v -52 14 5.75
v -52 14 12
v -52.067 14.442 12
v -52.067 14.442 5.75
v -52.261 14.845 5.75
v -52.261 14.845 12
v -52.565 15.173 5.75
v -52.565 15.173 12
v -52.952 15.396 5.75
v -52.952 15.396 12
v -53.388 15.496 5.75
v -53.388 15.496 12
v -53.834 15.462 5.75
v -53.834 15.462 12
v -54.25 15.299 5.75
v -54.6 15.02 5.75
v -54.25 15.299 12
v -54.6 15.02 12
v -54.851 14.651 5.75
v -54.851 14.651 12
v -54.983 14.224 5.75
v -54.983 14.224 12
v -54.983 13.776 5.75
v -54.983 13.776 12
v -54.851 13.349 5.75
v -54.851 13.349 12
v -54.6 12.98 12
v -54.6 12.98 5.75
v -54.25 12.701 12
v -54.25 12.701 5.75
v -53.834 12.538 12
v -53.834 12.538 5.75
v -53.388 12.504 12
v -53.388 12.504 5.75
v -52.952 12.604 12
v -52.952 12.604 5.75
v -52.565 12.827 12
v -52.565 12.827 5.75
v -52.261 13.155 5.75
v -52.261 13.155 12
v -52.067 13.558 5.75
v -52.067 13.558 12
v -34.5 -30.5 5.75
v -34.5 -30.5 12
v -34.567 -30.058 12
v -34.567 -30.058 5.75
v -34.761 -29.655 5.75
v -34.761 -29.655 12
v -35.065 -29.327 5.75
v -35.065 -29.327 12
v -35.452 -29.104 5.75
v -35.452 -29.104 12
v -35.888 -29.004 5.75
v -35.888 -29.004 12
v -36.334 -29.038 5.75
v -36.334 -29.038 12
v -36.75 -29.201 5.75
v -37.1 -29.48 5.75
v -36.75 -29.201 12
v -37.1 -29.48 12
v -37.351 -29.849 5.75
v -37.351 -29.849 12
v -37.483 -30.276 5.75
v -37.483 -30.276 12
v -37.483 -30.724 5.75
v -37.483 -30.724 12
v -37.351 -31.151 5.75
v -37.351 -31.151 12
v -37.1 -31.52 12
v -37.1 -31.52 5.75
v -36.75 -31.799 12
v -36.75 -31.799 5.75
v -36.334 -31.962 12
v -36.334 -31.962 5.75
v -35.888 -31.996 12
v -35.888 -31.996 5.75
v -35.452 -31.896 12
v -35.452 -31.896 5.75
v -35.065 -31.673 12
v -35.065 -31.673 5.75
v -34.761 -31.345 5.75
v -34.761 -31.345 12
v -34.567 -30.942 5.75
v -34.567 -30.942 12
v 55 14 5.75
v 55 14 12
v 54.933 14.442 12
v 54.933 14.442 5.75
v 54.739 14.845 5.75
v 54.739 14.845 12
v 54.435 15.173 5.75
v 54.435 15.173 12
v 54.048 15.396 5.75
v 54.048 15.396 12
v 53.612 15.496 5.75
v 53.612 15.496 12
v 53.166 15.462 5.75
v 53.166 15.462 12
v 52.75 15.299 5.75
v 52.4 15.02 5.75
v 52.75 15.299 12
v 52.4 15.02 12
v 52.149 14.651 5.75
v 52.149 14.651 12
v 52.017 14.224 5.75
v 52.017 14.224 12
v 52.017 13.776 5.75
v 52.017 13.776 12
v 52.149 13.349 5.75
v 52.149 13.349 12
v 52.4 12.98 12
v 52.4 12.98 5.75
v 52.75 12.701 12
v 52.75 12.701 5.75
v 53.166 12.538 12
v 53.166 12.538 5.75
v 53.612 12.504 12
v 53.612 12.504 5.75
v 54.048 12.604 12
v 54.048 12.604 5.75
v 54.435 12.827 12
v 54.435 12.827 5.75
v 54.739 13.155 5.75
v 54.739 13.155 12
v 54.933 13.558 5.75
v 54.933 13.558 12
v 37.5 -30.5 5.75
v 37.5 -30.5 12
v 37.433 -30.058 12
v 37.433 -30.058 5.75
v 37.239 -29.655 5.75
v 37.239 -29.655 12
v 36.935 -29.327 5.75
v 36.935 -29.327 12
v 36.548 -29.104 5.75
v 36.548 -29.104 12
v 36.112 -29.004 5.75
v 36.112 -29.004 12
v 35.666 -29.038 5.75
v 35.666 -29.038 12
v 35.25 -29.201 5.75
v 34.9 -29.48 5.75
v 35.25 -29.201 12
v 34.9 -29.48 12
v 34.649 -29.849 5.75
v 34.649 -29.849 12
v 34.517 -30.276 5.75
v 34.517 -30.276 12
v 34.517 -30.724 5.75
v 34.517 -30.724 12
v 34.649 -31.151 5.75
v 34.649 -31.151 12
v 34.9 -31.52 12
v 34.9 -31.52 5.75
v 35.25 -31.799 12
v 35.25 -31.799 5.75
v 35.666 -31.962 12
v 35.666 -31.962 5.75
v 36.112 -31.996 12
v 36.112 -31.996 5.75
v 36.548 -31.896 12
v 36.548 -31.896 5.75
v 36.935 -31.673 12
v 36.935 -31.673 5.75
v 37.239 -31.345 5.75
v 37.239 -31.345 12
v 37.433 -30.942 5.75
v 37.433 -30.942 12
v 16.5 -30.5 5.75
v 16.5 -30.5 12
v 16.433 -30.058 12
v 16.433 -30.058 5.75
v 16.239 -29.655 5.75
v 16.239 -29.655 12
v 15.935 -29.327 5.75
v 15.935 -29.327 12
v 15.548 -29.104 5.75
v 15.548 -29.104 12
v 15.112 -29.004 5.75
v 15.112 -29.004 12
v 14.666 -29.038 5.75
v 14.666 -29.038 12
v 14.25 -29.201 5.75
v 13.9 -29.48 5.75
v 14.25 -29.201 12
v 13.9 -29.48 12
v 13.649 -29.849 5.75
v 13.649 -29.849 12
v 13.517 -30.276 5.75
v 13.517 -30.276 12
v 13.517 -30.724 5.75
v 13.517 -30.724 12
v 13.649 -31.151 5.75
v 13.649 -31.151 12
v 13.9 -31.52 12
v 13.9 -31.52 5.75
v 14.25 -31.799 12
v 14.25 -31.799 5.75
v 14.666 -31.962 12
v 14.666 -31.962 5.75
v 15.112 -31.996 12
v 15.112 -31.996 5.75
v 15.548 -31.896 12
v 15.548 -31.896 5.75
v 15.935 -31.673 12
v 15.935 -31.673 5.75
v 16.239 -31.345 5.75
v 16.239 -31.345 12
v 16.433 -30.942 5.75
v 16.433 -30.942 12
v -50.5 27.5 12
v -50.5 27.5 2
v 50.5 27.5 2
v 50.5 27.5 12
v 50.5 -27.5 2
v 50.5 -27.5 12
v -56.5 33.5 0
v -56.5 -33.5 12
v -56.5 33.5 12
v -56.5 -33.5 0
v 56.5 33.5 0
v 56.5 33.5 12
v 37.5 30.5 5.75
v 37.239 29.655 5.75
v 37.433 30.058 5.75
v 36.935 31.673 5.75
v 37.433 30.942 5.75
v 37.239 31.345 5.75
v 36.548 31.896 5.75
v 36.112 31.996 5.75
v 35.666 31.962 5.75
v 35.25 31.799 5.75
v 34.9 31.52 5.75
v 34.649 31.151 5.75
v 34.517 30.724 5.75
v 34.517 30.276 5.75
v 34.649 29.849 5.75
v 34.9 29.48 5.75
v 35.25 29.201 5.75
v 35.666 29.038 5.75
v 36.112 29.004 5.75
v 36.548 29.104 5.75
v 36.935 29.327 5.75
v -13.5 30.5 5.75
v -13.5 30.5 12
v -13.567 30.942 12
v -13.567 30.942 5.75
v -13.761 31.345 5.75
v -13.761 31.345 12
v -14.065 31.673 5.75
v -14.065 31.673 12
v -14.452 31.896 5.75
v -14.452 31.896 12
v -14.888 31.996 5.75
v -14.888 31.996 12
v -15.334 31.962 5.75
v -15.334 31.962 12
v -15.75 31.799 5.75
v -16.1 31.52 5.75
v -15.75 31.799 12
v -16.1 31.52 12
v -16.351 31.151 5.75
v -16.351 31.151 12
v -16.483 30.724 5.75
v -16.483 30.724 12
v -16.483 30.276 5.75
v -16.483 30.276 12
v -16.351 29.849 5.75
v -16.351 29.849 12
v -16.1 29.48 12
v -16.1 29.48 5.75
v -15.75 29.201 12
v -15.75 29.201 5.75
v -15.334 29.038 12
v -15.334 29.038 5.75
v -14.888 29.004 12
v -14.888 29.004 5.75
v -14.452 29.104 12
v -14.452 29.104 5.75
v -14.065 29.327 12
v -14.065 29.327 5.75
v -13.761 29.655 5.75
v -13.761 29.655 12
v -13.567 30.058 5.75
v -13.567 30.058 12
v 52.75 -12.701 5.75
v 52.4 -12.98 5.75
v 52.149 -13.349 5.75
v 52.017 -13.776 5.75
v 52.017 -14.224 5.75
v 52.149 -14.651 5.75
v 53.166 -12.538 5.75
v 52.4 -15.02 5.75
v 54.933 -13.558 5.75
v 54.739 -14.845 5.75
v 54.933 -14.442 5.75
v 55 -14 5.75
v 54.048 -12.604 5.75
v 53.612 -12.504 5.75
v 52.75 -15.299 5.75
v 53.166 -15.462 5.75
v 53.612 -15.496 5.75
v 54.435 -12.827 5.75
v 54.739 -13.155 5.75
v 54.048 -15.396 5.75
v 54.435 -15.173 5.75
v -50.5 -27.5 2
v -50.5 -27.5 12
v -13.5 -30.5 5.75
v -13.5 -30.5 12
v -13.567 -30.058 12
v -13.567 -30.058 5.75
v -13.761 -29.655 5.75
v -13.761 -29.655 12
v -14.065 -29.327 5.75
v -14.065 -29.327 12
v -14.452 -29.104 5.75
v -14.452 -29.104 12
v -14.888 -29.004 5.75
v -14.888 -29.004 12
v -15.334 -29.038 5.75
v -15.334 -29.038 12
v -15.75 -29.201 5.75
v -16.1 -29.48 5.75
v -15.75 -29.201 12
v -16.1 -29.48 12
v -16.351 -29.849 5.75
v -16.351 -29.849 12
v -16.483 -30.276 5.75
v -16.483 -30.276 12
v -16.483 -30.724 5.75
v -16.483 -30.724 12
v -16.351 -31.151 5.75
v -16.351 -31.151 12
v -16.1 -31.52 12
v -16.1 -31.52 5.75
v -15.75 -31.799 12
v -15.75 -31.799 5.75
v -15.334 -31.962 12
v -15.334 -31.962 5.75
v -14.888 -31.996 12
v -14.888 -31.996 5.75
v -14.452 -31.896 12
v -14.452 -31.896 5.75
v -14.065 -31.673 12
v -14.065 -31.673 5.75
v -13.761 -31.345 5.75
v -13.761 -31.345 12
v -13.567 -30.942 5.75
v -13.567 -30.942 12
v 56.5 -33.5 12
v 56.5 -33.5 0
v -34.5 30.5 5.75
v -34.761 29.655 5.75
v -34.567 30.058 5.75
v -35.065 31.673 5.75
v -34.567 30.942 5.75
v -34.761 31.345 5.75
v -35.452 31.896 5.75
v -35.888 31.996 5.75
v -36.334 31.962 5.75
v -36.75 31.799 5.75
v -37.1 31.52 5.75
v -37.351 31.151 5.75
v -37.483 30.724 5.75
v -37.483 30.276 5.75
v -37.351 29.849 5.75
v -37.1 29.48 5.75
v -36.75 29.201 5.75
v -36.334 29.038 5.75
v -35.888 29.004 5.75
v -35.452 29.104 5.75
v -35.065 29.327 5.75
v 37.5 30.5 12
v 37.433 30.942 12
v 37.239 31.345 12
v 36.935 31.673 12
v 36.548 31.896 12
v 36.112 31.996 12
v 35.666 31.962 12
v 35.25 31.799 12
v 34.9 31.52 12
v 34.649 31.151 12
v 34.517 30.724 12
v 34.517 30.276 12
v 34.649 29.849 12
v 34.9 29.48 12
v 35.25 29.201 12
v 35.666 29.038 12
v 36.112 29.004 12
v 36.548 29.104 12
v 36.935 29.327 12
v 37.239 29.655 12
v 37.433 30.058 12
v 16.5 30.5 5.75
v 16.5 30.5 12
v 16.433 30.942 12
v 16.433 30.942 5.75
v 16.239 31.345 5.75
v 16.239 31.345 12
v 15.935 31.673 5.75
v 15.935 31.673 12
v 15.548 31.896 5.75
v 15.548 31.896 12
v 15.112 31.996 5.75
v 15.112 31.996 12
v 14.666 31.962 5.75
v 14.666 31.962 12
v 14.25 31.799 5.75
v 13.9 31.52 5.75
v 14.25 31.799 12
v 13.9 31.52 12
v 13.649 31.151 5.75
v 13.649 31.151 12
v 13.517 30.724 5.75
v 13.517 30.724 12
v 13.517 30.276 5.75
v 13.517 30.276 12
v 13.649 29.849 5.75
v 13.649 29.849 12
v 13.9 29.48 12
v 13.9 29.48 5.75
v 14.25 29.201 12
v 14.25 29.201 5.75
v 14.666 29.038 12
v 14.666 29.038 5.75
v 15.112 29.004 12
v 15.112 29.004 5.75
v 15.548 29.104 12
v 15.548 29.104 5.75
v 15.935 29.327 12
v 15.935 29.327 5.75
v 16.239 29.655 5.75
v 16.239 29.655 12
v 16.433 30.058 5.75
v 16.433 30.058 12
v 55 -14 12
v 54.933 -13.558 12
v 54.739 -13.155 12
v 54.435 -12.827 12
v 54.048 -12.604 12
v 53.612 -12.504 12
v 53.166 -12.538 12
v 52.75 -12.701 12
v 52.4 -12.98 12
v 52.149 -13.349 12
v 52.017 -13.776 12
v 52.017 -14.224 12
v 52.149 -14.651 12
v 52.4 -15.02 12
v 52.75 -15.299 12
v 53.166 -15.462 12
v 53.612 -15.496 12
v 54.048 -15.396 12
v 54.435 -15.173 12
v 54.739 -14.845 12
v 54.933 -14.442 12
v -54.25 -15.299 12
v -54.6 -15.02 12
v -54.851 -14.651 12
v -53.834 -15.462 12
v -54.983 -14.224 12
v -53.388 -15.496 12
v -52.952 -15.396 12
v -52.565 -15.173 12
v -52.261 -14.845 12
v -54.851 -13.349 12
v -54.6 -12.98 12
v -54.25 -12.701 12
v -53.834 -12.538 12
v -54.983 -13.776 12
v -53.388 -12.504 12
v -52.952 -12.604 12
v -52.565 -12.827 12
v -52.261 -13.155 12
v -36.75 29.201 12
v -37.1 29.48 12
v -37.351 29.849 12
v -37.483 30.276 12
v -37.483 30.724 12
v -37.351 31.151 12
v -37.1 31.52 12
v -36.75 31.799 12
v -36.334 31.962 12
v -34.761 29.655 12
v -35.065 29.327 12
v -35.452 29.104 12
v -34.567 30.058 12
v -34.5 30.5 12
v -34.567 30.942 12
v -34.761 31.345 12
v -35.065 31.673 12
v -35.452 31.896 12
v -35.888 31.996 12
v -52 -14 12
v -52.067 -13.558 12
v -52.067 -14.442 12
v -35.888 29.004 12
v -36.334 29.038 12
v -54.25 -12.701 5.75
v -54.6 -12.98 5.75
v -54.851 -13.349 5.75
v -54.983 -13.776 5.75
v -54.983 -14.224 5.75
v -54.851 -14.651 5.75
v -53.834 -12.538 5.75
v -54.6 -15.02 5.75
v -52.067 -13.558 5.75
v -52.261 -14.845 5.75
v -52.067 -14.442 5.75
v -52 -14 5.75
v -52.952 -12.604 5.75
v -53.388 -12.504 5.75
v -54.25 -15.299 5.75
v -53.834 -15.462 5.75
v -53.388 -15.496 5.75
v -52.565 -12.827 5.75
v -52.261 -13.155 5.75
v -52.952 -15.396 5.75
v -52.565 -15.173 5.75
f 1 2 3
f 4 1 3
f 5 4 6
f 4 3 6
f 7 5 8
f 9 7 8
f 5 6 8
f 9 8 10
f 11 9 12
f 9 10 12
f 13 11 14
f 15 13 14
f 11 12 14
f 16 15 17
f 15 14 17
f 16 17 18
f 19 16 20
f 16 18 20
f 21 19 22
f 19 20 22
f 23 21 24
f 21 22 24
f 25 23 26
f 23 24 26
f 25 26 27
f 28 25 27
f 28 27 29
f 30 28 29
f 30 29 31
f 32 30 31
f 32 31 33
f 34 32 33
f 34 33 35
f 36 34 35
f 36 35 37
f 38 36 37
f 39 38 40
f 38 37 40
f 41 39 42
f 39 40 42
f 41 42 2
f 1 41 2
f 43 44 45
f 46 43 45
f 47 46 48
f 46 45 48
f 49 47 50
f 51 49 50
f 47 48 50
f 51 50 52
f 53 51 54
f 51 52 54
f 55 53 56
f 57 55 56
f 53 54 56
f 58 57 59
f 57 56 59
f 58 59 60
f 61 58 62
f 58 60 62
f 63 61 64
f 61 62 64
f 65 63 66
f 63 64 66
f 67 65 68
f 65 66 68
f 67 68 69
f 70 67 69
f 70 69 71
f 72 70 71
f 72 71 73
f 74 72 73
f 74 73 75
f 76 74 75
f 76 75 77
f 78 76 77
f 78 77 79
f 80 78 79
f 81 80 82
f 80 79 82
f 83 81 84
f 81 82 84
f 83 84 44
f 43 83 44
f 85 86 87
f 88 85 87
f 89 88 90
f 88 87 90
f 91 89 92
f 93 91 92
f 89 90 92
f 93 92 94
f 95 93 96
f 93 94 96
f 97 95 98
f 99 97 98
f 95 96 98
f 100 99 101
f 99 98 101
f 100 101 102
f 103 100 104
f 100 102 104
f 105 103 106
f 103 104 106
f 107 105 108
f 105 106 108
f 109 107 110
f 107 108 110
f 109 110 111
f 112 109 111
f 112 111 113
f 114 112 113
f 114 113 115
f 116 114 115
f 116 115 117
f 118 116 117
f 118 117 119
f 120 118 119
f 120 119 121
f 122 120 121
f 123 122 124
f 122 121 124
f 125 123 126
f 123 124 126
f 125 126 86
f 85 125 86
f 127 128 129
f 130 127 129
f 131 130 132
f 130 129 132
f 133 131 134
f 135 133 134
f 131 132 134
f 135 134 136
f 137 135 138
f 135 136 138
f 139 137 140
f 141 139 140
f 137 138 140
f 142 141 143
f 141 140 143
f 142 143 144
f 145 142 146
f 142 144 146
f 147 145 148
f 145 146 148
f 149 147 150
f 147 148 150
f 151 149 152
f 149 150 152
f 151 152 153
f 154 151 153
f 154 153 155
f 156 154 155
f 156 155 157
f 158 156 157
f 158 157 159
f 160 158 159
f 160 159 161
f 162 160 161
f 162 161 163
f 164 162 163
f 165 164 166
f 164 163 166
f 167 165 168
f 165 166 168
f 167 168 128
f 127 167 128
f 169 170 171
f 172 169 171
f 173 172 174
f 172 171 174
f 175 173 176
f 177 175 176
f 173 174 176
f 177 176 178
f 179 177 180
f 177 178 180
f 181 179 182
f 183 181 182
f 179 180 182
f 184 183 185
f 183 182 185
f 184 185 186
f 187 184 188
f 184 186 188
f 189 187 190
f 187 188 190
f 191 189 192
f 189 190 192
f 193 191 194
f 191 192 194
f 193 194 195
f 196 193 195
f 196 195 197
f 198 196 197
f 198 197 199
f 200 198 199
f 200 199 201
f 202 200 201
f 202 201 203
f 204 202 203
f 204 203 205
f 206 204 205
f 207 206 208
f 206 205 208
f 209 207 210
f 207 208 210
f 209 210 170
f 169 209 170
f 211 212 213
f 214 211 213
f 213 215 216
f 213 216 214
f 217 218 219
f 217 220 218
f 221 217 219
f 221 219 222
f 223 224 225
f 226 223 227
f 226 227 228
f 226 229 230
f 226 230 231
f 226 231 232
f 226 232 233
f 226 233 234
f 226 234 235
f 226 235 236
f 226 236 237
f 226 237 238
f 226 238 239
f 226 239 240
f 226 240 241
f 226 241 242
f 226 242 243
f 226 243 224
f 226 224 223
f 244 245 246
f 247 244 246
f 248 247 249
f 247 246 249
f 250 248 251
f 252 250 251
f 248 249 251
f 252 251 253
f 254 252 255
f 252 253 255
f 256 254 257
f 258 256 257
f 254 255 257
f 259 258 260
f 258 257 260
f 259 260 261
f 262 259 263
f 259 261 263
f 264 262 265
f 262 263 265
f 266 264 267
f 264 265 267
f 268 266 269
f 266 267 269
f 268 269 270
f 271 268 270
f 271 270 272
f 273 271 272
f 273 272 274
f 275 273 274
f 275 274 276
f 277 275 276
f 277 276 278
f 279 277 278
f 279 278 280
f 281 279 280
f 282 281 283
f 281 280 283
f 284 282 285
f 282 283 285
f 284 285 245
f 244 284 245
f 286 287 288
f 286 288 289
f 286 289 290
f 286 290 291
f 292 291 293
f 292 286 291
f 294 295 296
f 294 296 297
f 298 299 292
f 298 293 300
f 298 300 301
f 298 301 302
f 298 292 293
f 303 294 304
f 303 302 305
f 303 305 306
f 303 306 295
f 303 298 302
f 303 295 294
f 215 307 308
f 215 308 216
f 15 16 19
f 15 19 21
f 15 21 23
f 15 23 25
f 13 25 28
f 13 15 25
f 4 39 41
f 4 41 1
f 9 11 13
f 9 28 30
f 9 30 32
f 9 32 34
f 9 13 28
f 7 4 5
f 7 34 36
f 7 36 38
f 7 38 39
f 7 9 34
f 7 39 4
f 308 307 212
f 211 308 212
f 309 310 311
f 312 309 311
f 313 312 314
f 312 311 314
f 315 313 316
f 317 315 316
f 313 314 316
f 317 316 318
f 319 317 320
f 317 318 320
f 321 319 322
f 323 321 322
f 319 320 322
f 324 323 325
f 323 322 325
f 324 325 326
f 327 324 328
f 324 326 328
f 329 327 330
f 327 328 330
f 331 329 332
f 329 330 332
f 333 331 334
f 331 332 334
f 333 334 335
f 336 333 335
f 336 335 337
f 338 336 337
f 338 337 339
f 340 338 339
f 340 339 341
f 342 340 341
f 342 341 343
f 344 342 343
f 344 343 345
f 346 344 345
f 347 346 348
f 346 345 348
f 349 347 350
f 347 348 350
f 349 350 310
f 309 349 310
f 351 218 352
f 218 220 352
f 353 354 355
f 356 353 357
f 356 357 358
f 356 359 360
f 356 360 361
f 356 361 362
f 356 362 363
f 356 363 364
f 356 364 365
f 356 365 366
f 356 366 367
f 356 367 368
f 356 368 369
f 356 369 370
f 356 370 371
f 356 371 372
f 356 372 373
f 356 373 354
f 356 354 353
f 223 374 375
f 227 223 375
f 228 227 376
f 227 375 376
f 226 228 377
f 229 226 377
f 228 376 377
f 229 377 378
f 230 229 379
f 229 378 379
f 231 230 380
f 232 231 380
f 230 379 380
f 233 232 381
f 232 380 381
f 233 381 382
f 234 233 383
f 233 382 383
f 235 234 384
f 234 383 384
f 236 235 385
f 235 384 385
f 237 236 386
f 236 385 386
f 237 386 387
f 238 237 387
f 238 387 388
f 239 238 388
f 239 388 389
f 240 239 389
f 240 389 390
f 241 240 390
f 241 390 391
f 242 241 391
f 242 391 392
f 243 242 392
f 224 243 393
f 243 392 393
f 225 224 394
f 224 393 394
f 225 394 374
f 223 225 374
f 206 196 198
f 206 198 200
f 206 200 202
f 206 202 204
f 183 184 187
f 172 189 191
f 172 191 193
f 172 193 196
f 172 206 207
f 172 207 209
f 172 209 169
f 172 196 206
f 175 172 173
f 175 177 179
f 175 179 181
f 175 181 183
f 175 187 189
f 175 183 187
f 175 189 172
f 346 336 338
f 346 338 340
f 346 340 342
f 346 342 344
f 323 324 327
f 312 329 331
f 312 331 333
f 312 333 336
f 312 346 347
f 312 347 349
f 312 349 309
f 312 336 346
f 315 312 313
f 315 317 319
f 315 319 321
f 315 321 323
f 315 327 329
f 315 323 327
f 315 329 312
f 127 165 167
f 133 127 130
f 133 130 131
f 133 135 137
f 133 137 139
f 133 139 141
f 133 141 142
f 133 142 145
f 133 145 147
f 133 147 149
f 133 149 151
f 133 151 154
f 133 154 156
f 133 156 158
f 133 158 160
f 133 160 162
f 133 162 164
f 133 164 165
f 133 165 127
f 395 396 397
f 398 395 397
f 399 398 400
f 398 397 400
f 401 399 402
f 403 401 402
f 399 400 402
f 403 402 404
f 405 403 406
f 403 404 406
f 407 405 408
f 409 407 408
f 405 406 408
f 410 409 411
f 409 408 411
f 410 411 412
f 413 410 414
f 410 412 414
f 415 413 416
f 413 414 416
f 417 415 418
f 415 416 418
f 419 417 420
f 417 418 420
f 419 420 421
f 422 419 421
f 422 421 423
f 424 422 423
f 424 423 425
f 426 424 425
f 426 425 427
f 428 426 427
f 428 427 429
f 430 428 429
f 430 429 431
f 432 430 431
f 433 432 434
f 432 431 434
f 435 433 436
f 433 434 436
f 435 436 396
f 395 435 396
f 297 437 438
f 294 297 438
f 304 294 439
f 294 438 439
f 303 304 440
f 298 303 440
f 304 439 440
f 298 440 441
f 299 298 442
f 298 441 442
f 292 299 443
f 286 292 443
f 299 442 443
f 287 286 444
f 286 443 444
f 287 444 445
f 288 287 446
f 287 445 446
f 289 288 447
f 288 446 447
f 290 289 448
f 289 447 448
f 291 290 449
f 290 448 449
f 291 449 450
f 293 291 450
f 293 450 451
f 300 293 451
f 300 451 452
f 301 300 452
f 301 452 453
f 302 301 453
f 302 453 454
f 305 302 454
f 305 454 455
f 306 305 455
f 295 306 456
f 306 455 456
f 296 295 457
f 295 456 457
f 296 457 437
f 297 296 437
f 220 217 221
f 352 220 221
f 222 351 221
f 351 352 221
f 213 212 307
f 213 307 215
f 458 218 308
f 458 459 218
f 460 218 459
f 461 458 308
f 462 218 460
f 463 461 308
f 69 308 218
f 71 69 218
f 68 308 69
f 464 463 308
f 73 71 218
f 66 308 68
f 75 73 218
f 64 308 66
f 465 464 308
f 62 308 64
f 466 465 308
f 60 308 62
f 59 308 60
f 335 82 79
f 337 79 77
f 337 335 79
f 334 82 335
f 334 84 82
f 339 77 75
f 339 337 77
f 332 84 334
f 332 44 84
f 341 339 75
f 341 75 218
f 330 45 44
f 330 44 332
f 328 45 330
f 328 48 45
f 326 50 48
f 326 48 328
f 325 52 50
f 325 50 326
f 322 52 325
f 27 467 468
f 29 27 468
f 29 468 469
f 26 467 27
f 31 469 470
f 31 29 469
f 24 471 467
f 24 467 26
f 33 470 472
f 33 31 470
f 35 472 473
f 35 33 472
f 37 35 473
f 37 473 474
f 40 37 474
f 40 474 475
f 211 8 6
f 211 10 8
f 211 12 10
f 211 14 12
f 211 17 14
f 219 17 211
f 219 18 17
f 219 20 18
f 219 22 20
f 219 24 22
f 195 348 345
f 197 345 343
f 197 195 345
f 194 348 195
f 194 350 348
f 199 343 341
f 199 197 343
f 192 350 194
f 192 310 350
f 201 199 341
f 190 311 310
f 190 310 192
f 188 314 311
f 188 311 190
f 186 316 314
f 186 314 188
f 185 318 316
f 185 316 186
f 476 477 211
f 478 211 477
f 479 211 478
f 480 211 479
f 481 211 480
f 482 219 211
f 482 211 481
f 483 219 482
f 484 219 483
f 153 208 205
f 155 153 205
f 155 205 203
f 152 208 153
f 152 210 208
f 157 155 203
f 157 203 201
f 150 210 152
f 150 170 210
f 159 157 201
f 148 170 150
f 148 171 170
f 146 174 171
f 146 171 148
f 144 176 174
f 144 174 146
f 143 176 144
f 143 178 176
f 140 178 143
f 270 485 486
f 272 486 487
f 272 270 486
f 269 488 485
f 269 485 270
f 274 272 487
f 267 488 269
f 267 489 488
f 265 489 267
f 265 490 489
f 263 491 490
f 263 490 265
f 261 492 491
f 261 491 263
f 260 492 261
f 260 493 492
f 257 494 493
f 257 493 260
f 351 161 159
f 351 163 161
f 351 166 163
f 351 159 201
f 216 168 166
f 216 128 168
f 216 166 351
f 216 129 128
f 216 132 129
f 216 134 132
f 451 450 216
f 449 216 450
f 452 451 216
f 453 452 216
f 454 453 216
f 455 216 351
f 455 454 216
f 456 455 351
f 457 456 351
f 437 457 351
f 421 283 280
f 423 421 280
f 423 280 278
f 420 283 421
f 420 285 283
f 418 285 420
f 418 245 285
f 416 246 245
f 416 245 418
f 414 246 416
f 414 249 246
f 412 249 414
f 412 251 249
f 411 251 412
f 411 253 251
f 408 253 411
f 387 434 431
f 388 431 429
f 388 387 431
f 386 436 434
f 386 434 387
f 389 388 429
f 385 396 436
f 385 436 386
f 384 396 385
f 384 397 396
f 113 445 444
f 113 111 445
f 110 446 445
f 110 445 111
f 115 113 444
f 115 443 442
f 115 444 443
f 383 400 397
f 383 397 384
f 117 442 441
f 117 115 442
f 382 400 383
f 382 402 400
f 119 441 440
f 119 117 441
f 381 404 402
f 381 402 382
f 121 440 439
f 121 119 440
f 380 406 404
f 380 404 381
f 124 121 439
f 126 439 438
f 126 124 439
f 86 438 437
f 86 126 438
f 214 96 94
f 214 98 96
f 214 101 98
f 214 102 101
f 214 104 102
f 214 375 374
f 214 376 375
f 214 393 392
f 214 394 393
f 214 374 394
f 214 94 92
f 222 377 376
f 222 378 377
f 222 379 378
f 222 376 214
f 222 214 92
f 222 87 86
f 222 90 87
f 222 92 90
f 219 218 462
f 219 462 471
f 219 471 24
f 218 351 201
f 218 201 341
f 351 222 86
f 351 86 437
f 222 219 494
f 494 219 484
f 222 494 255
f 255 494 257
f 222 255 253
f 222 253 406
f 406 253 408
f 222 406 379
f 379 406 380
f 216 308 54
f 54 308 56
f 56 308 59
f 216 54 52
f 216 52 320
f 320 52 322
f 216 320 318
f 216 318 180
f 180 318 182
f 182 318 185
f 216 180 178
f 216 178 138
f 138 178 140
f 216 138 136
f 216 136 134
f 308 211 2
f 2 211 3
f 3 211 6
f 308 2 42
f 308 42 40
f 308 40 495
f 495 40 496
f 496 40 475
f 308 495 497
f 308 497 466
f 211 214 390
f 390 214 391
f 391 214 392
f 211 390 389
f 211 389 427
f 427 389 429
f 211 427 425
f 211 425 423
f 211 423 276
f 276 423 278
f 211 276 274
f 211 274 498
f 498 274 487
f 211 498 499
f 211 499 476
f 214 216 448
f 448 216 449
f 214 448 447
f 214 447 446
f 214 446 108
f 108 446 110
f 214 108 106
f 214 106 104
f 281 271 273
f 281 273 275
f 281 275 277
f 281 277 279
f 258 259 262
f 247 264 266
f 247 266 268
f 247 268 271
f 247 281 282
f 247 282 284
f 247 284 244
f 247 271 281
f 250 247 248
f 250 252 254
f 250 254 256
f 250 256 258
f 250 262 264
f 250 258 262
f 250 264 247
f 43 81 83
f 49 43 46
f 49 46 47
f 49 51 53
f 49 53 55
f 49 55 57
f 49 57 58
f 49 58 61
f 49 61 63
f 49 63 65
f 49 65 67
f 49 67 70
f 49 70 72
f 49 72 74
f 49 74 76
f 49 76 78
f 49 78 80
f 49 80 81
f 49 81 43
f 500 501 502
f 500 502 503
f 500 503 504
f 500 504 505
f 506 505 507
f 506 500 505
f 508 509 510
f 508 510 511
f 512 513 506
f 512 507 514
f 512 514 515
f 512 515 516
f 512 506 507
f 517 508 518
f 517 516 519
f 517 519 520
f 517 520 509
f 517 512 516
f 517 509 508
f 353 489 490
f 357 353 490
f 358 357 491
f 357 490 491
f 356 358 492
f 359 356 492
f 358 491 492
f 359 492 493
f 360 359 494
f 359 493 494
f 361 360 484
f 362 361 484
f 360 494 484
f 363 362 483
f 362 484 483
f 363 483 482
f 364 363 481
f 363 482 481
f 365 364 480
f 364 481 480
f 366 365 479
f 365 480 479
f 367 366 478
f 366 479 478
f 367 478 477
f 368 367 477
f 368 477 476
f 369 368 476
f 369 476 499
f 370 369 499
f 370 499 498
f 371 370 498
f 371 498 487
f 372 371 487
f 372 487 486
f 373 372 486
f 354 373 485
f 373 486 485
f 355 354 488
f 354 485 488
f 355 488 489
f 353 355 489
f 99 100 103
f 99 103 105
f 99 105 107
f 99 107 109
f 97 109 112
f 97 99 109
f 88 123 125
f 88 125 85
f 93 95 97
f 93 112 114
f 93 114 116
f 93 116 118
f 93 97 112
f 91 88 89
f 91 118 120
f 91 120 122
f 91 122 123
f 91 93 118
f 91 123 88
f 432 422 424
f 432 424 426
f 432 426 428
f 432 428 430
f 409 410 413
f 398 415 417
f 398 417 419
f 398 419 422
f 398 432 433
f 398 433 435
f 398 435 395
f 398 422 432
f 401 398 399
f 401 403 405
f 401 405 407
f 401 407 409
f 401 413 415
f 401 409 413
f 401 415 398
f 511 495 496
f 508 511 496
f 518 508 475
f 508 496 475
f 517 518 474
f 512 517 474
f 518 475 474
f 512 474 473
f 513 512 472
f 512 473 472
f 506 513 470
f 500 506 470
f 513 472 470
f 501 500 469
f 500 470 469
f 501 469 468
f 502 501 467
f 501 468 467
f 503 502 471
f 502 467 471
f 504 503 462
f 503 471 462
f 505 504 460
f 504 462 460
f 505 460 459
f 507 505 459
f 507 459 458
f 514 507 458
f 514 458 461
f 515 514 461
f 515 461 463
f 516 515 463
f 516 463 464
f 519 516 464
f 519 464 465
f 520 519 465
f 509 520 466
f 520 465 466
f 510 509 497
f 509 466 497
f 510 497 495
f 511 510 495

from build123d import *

# Parameters (mm, degrees)
F0_W     = 113
F0_H     = 67
F1_DEPTH = 2
F2_W     = 113
F2_H     = 67
F2_W_2   = 101
F2_H_2   = 55
F3_DEPTH = 10
F4_R     = 1.5
F5_DEPTH = 6.25


with BuildPart() as f1:
    # F0 (on Top) → F1 (new body)
    with BuildSketch(Plane.XY):
        Rectangle(F0_W, F0_H)
    extrude(amount=F1_DEPTH)

    # F2 (on face) → F3 (join)
    with BuildSketch(Plane.XY.offset(2)):
        Rectangle(F2_W, F2_H)
        Rectangle(F2_W_2, F2_H_2, mode=Mode.SUBTRACT)
    extrude(amount=F3_DEPTH)

    # F4 (on face) → F5 (cut)
    with BuildSketch(Plane.XY.offset(12)):
        with Locations((-36, 30.5)):
            Circle(F4_R)
        with Locations((-15, 30.5)):
            Circle(F4_R)
        with Locations((15, 30.5)):
            Circle(F4_R)
        with Locations((36, 30.5)):
            Circle(F4_R)
        with Locations((-15, -30.5)):
            Circle(F4_R)
        with Locations((-36, -30.5)):
            Circle(F4_R)
        with Locations((15, -30.5)):
            Circle(F4_R)
        with Locations((36, -30.5)):
            Circle(F4_R)
        with Locations((-53.5, 14)):
            Circle(F4_R)
        with Locations((-53.5, -14)):
            Circle(F4_R)
        with Locations((53.5, 14)):
            Circle(F4_R)
        with Locations((53.5, -14)):
            Circle(F4_R)
    extrude(amount=-F5_DEPTH, mode=Mode.SUBTRACT)


solid = f1.part
